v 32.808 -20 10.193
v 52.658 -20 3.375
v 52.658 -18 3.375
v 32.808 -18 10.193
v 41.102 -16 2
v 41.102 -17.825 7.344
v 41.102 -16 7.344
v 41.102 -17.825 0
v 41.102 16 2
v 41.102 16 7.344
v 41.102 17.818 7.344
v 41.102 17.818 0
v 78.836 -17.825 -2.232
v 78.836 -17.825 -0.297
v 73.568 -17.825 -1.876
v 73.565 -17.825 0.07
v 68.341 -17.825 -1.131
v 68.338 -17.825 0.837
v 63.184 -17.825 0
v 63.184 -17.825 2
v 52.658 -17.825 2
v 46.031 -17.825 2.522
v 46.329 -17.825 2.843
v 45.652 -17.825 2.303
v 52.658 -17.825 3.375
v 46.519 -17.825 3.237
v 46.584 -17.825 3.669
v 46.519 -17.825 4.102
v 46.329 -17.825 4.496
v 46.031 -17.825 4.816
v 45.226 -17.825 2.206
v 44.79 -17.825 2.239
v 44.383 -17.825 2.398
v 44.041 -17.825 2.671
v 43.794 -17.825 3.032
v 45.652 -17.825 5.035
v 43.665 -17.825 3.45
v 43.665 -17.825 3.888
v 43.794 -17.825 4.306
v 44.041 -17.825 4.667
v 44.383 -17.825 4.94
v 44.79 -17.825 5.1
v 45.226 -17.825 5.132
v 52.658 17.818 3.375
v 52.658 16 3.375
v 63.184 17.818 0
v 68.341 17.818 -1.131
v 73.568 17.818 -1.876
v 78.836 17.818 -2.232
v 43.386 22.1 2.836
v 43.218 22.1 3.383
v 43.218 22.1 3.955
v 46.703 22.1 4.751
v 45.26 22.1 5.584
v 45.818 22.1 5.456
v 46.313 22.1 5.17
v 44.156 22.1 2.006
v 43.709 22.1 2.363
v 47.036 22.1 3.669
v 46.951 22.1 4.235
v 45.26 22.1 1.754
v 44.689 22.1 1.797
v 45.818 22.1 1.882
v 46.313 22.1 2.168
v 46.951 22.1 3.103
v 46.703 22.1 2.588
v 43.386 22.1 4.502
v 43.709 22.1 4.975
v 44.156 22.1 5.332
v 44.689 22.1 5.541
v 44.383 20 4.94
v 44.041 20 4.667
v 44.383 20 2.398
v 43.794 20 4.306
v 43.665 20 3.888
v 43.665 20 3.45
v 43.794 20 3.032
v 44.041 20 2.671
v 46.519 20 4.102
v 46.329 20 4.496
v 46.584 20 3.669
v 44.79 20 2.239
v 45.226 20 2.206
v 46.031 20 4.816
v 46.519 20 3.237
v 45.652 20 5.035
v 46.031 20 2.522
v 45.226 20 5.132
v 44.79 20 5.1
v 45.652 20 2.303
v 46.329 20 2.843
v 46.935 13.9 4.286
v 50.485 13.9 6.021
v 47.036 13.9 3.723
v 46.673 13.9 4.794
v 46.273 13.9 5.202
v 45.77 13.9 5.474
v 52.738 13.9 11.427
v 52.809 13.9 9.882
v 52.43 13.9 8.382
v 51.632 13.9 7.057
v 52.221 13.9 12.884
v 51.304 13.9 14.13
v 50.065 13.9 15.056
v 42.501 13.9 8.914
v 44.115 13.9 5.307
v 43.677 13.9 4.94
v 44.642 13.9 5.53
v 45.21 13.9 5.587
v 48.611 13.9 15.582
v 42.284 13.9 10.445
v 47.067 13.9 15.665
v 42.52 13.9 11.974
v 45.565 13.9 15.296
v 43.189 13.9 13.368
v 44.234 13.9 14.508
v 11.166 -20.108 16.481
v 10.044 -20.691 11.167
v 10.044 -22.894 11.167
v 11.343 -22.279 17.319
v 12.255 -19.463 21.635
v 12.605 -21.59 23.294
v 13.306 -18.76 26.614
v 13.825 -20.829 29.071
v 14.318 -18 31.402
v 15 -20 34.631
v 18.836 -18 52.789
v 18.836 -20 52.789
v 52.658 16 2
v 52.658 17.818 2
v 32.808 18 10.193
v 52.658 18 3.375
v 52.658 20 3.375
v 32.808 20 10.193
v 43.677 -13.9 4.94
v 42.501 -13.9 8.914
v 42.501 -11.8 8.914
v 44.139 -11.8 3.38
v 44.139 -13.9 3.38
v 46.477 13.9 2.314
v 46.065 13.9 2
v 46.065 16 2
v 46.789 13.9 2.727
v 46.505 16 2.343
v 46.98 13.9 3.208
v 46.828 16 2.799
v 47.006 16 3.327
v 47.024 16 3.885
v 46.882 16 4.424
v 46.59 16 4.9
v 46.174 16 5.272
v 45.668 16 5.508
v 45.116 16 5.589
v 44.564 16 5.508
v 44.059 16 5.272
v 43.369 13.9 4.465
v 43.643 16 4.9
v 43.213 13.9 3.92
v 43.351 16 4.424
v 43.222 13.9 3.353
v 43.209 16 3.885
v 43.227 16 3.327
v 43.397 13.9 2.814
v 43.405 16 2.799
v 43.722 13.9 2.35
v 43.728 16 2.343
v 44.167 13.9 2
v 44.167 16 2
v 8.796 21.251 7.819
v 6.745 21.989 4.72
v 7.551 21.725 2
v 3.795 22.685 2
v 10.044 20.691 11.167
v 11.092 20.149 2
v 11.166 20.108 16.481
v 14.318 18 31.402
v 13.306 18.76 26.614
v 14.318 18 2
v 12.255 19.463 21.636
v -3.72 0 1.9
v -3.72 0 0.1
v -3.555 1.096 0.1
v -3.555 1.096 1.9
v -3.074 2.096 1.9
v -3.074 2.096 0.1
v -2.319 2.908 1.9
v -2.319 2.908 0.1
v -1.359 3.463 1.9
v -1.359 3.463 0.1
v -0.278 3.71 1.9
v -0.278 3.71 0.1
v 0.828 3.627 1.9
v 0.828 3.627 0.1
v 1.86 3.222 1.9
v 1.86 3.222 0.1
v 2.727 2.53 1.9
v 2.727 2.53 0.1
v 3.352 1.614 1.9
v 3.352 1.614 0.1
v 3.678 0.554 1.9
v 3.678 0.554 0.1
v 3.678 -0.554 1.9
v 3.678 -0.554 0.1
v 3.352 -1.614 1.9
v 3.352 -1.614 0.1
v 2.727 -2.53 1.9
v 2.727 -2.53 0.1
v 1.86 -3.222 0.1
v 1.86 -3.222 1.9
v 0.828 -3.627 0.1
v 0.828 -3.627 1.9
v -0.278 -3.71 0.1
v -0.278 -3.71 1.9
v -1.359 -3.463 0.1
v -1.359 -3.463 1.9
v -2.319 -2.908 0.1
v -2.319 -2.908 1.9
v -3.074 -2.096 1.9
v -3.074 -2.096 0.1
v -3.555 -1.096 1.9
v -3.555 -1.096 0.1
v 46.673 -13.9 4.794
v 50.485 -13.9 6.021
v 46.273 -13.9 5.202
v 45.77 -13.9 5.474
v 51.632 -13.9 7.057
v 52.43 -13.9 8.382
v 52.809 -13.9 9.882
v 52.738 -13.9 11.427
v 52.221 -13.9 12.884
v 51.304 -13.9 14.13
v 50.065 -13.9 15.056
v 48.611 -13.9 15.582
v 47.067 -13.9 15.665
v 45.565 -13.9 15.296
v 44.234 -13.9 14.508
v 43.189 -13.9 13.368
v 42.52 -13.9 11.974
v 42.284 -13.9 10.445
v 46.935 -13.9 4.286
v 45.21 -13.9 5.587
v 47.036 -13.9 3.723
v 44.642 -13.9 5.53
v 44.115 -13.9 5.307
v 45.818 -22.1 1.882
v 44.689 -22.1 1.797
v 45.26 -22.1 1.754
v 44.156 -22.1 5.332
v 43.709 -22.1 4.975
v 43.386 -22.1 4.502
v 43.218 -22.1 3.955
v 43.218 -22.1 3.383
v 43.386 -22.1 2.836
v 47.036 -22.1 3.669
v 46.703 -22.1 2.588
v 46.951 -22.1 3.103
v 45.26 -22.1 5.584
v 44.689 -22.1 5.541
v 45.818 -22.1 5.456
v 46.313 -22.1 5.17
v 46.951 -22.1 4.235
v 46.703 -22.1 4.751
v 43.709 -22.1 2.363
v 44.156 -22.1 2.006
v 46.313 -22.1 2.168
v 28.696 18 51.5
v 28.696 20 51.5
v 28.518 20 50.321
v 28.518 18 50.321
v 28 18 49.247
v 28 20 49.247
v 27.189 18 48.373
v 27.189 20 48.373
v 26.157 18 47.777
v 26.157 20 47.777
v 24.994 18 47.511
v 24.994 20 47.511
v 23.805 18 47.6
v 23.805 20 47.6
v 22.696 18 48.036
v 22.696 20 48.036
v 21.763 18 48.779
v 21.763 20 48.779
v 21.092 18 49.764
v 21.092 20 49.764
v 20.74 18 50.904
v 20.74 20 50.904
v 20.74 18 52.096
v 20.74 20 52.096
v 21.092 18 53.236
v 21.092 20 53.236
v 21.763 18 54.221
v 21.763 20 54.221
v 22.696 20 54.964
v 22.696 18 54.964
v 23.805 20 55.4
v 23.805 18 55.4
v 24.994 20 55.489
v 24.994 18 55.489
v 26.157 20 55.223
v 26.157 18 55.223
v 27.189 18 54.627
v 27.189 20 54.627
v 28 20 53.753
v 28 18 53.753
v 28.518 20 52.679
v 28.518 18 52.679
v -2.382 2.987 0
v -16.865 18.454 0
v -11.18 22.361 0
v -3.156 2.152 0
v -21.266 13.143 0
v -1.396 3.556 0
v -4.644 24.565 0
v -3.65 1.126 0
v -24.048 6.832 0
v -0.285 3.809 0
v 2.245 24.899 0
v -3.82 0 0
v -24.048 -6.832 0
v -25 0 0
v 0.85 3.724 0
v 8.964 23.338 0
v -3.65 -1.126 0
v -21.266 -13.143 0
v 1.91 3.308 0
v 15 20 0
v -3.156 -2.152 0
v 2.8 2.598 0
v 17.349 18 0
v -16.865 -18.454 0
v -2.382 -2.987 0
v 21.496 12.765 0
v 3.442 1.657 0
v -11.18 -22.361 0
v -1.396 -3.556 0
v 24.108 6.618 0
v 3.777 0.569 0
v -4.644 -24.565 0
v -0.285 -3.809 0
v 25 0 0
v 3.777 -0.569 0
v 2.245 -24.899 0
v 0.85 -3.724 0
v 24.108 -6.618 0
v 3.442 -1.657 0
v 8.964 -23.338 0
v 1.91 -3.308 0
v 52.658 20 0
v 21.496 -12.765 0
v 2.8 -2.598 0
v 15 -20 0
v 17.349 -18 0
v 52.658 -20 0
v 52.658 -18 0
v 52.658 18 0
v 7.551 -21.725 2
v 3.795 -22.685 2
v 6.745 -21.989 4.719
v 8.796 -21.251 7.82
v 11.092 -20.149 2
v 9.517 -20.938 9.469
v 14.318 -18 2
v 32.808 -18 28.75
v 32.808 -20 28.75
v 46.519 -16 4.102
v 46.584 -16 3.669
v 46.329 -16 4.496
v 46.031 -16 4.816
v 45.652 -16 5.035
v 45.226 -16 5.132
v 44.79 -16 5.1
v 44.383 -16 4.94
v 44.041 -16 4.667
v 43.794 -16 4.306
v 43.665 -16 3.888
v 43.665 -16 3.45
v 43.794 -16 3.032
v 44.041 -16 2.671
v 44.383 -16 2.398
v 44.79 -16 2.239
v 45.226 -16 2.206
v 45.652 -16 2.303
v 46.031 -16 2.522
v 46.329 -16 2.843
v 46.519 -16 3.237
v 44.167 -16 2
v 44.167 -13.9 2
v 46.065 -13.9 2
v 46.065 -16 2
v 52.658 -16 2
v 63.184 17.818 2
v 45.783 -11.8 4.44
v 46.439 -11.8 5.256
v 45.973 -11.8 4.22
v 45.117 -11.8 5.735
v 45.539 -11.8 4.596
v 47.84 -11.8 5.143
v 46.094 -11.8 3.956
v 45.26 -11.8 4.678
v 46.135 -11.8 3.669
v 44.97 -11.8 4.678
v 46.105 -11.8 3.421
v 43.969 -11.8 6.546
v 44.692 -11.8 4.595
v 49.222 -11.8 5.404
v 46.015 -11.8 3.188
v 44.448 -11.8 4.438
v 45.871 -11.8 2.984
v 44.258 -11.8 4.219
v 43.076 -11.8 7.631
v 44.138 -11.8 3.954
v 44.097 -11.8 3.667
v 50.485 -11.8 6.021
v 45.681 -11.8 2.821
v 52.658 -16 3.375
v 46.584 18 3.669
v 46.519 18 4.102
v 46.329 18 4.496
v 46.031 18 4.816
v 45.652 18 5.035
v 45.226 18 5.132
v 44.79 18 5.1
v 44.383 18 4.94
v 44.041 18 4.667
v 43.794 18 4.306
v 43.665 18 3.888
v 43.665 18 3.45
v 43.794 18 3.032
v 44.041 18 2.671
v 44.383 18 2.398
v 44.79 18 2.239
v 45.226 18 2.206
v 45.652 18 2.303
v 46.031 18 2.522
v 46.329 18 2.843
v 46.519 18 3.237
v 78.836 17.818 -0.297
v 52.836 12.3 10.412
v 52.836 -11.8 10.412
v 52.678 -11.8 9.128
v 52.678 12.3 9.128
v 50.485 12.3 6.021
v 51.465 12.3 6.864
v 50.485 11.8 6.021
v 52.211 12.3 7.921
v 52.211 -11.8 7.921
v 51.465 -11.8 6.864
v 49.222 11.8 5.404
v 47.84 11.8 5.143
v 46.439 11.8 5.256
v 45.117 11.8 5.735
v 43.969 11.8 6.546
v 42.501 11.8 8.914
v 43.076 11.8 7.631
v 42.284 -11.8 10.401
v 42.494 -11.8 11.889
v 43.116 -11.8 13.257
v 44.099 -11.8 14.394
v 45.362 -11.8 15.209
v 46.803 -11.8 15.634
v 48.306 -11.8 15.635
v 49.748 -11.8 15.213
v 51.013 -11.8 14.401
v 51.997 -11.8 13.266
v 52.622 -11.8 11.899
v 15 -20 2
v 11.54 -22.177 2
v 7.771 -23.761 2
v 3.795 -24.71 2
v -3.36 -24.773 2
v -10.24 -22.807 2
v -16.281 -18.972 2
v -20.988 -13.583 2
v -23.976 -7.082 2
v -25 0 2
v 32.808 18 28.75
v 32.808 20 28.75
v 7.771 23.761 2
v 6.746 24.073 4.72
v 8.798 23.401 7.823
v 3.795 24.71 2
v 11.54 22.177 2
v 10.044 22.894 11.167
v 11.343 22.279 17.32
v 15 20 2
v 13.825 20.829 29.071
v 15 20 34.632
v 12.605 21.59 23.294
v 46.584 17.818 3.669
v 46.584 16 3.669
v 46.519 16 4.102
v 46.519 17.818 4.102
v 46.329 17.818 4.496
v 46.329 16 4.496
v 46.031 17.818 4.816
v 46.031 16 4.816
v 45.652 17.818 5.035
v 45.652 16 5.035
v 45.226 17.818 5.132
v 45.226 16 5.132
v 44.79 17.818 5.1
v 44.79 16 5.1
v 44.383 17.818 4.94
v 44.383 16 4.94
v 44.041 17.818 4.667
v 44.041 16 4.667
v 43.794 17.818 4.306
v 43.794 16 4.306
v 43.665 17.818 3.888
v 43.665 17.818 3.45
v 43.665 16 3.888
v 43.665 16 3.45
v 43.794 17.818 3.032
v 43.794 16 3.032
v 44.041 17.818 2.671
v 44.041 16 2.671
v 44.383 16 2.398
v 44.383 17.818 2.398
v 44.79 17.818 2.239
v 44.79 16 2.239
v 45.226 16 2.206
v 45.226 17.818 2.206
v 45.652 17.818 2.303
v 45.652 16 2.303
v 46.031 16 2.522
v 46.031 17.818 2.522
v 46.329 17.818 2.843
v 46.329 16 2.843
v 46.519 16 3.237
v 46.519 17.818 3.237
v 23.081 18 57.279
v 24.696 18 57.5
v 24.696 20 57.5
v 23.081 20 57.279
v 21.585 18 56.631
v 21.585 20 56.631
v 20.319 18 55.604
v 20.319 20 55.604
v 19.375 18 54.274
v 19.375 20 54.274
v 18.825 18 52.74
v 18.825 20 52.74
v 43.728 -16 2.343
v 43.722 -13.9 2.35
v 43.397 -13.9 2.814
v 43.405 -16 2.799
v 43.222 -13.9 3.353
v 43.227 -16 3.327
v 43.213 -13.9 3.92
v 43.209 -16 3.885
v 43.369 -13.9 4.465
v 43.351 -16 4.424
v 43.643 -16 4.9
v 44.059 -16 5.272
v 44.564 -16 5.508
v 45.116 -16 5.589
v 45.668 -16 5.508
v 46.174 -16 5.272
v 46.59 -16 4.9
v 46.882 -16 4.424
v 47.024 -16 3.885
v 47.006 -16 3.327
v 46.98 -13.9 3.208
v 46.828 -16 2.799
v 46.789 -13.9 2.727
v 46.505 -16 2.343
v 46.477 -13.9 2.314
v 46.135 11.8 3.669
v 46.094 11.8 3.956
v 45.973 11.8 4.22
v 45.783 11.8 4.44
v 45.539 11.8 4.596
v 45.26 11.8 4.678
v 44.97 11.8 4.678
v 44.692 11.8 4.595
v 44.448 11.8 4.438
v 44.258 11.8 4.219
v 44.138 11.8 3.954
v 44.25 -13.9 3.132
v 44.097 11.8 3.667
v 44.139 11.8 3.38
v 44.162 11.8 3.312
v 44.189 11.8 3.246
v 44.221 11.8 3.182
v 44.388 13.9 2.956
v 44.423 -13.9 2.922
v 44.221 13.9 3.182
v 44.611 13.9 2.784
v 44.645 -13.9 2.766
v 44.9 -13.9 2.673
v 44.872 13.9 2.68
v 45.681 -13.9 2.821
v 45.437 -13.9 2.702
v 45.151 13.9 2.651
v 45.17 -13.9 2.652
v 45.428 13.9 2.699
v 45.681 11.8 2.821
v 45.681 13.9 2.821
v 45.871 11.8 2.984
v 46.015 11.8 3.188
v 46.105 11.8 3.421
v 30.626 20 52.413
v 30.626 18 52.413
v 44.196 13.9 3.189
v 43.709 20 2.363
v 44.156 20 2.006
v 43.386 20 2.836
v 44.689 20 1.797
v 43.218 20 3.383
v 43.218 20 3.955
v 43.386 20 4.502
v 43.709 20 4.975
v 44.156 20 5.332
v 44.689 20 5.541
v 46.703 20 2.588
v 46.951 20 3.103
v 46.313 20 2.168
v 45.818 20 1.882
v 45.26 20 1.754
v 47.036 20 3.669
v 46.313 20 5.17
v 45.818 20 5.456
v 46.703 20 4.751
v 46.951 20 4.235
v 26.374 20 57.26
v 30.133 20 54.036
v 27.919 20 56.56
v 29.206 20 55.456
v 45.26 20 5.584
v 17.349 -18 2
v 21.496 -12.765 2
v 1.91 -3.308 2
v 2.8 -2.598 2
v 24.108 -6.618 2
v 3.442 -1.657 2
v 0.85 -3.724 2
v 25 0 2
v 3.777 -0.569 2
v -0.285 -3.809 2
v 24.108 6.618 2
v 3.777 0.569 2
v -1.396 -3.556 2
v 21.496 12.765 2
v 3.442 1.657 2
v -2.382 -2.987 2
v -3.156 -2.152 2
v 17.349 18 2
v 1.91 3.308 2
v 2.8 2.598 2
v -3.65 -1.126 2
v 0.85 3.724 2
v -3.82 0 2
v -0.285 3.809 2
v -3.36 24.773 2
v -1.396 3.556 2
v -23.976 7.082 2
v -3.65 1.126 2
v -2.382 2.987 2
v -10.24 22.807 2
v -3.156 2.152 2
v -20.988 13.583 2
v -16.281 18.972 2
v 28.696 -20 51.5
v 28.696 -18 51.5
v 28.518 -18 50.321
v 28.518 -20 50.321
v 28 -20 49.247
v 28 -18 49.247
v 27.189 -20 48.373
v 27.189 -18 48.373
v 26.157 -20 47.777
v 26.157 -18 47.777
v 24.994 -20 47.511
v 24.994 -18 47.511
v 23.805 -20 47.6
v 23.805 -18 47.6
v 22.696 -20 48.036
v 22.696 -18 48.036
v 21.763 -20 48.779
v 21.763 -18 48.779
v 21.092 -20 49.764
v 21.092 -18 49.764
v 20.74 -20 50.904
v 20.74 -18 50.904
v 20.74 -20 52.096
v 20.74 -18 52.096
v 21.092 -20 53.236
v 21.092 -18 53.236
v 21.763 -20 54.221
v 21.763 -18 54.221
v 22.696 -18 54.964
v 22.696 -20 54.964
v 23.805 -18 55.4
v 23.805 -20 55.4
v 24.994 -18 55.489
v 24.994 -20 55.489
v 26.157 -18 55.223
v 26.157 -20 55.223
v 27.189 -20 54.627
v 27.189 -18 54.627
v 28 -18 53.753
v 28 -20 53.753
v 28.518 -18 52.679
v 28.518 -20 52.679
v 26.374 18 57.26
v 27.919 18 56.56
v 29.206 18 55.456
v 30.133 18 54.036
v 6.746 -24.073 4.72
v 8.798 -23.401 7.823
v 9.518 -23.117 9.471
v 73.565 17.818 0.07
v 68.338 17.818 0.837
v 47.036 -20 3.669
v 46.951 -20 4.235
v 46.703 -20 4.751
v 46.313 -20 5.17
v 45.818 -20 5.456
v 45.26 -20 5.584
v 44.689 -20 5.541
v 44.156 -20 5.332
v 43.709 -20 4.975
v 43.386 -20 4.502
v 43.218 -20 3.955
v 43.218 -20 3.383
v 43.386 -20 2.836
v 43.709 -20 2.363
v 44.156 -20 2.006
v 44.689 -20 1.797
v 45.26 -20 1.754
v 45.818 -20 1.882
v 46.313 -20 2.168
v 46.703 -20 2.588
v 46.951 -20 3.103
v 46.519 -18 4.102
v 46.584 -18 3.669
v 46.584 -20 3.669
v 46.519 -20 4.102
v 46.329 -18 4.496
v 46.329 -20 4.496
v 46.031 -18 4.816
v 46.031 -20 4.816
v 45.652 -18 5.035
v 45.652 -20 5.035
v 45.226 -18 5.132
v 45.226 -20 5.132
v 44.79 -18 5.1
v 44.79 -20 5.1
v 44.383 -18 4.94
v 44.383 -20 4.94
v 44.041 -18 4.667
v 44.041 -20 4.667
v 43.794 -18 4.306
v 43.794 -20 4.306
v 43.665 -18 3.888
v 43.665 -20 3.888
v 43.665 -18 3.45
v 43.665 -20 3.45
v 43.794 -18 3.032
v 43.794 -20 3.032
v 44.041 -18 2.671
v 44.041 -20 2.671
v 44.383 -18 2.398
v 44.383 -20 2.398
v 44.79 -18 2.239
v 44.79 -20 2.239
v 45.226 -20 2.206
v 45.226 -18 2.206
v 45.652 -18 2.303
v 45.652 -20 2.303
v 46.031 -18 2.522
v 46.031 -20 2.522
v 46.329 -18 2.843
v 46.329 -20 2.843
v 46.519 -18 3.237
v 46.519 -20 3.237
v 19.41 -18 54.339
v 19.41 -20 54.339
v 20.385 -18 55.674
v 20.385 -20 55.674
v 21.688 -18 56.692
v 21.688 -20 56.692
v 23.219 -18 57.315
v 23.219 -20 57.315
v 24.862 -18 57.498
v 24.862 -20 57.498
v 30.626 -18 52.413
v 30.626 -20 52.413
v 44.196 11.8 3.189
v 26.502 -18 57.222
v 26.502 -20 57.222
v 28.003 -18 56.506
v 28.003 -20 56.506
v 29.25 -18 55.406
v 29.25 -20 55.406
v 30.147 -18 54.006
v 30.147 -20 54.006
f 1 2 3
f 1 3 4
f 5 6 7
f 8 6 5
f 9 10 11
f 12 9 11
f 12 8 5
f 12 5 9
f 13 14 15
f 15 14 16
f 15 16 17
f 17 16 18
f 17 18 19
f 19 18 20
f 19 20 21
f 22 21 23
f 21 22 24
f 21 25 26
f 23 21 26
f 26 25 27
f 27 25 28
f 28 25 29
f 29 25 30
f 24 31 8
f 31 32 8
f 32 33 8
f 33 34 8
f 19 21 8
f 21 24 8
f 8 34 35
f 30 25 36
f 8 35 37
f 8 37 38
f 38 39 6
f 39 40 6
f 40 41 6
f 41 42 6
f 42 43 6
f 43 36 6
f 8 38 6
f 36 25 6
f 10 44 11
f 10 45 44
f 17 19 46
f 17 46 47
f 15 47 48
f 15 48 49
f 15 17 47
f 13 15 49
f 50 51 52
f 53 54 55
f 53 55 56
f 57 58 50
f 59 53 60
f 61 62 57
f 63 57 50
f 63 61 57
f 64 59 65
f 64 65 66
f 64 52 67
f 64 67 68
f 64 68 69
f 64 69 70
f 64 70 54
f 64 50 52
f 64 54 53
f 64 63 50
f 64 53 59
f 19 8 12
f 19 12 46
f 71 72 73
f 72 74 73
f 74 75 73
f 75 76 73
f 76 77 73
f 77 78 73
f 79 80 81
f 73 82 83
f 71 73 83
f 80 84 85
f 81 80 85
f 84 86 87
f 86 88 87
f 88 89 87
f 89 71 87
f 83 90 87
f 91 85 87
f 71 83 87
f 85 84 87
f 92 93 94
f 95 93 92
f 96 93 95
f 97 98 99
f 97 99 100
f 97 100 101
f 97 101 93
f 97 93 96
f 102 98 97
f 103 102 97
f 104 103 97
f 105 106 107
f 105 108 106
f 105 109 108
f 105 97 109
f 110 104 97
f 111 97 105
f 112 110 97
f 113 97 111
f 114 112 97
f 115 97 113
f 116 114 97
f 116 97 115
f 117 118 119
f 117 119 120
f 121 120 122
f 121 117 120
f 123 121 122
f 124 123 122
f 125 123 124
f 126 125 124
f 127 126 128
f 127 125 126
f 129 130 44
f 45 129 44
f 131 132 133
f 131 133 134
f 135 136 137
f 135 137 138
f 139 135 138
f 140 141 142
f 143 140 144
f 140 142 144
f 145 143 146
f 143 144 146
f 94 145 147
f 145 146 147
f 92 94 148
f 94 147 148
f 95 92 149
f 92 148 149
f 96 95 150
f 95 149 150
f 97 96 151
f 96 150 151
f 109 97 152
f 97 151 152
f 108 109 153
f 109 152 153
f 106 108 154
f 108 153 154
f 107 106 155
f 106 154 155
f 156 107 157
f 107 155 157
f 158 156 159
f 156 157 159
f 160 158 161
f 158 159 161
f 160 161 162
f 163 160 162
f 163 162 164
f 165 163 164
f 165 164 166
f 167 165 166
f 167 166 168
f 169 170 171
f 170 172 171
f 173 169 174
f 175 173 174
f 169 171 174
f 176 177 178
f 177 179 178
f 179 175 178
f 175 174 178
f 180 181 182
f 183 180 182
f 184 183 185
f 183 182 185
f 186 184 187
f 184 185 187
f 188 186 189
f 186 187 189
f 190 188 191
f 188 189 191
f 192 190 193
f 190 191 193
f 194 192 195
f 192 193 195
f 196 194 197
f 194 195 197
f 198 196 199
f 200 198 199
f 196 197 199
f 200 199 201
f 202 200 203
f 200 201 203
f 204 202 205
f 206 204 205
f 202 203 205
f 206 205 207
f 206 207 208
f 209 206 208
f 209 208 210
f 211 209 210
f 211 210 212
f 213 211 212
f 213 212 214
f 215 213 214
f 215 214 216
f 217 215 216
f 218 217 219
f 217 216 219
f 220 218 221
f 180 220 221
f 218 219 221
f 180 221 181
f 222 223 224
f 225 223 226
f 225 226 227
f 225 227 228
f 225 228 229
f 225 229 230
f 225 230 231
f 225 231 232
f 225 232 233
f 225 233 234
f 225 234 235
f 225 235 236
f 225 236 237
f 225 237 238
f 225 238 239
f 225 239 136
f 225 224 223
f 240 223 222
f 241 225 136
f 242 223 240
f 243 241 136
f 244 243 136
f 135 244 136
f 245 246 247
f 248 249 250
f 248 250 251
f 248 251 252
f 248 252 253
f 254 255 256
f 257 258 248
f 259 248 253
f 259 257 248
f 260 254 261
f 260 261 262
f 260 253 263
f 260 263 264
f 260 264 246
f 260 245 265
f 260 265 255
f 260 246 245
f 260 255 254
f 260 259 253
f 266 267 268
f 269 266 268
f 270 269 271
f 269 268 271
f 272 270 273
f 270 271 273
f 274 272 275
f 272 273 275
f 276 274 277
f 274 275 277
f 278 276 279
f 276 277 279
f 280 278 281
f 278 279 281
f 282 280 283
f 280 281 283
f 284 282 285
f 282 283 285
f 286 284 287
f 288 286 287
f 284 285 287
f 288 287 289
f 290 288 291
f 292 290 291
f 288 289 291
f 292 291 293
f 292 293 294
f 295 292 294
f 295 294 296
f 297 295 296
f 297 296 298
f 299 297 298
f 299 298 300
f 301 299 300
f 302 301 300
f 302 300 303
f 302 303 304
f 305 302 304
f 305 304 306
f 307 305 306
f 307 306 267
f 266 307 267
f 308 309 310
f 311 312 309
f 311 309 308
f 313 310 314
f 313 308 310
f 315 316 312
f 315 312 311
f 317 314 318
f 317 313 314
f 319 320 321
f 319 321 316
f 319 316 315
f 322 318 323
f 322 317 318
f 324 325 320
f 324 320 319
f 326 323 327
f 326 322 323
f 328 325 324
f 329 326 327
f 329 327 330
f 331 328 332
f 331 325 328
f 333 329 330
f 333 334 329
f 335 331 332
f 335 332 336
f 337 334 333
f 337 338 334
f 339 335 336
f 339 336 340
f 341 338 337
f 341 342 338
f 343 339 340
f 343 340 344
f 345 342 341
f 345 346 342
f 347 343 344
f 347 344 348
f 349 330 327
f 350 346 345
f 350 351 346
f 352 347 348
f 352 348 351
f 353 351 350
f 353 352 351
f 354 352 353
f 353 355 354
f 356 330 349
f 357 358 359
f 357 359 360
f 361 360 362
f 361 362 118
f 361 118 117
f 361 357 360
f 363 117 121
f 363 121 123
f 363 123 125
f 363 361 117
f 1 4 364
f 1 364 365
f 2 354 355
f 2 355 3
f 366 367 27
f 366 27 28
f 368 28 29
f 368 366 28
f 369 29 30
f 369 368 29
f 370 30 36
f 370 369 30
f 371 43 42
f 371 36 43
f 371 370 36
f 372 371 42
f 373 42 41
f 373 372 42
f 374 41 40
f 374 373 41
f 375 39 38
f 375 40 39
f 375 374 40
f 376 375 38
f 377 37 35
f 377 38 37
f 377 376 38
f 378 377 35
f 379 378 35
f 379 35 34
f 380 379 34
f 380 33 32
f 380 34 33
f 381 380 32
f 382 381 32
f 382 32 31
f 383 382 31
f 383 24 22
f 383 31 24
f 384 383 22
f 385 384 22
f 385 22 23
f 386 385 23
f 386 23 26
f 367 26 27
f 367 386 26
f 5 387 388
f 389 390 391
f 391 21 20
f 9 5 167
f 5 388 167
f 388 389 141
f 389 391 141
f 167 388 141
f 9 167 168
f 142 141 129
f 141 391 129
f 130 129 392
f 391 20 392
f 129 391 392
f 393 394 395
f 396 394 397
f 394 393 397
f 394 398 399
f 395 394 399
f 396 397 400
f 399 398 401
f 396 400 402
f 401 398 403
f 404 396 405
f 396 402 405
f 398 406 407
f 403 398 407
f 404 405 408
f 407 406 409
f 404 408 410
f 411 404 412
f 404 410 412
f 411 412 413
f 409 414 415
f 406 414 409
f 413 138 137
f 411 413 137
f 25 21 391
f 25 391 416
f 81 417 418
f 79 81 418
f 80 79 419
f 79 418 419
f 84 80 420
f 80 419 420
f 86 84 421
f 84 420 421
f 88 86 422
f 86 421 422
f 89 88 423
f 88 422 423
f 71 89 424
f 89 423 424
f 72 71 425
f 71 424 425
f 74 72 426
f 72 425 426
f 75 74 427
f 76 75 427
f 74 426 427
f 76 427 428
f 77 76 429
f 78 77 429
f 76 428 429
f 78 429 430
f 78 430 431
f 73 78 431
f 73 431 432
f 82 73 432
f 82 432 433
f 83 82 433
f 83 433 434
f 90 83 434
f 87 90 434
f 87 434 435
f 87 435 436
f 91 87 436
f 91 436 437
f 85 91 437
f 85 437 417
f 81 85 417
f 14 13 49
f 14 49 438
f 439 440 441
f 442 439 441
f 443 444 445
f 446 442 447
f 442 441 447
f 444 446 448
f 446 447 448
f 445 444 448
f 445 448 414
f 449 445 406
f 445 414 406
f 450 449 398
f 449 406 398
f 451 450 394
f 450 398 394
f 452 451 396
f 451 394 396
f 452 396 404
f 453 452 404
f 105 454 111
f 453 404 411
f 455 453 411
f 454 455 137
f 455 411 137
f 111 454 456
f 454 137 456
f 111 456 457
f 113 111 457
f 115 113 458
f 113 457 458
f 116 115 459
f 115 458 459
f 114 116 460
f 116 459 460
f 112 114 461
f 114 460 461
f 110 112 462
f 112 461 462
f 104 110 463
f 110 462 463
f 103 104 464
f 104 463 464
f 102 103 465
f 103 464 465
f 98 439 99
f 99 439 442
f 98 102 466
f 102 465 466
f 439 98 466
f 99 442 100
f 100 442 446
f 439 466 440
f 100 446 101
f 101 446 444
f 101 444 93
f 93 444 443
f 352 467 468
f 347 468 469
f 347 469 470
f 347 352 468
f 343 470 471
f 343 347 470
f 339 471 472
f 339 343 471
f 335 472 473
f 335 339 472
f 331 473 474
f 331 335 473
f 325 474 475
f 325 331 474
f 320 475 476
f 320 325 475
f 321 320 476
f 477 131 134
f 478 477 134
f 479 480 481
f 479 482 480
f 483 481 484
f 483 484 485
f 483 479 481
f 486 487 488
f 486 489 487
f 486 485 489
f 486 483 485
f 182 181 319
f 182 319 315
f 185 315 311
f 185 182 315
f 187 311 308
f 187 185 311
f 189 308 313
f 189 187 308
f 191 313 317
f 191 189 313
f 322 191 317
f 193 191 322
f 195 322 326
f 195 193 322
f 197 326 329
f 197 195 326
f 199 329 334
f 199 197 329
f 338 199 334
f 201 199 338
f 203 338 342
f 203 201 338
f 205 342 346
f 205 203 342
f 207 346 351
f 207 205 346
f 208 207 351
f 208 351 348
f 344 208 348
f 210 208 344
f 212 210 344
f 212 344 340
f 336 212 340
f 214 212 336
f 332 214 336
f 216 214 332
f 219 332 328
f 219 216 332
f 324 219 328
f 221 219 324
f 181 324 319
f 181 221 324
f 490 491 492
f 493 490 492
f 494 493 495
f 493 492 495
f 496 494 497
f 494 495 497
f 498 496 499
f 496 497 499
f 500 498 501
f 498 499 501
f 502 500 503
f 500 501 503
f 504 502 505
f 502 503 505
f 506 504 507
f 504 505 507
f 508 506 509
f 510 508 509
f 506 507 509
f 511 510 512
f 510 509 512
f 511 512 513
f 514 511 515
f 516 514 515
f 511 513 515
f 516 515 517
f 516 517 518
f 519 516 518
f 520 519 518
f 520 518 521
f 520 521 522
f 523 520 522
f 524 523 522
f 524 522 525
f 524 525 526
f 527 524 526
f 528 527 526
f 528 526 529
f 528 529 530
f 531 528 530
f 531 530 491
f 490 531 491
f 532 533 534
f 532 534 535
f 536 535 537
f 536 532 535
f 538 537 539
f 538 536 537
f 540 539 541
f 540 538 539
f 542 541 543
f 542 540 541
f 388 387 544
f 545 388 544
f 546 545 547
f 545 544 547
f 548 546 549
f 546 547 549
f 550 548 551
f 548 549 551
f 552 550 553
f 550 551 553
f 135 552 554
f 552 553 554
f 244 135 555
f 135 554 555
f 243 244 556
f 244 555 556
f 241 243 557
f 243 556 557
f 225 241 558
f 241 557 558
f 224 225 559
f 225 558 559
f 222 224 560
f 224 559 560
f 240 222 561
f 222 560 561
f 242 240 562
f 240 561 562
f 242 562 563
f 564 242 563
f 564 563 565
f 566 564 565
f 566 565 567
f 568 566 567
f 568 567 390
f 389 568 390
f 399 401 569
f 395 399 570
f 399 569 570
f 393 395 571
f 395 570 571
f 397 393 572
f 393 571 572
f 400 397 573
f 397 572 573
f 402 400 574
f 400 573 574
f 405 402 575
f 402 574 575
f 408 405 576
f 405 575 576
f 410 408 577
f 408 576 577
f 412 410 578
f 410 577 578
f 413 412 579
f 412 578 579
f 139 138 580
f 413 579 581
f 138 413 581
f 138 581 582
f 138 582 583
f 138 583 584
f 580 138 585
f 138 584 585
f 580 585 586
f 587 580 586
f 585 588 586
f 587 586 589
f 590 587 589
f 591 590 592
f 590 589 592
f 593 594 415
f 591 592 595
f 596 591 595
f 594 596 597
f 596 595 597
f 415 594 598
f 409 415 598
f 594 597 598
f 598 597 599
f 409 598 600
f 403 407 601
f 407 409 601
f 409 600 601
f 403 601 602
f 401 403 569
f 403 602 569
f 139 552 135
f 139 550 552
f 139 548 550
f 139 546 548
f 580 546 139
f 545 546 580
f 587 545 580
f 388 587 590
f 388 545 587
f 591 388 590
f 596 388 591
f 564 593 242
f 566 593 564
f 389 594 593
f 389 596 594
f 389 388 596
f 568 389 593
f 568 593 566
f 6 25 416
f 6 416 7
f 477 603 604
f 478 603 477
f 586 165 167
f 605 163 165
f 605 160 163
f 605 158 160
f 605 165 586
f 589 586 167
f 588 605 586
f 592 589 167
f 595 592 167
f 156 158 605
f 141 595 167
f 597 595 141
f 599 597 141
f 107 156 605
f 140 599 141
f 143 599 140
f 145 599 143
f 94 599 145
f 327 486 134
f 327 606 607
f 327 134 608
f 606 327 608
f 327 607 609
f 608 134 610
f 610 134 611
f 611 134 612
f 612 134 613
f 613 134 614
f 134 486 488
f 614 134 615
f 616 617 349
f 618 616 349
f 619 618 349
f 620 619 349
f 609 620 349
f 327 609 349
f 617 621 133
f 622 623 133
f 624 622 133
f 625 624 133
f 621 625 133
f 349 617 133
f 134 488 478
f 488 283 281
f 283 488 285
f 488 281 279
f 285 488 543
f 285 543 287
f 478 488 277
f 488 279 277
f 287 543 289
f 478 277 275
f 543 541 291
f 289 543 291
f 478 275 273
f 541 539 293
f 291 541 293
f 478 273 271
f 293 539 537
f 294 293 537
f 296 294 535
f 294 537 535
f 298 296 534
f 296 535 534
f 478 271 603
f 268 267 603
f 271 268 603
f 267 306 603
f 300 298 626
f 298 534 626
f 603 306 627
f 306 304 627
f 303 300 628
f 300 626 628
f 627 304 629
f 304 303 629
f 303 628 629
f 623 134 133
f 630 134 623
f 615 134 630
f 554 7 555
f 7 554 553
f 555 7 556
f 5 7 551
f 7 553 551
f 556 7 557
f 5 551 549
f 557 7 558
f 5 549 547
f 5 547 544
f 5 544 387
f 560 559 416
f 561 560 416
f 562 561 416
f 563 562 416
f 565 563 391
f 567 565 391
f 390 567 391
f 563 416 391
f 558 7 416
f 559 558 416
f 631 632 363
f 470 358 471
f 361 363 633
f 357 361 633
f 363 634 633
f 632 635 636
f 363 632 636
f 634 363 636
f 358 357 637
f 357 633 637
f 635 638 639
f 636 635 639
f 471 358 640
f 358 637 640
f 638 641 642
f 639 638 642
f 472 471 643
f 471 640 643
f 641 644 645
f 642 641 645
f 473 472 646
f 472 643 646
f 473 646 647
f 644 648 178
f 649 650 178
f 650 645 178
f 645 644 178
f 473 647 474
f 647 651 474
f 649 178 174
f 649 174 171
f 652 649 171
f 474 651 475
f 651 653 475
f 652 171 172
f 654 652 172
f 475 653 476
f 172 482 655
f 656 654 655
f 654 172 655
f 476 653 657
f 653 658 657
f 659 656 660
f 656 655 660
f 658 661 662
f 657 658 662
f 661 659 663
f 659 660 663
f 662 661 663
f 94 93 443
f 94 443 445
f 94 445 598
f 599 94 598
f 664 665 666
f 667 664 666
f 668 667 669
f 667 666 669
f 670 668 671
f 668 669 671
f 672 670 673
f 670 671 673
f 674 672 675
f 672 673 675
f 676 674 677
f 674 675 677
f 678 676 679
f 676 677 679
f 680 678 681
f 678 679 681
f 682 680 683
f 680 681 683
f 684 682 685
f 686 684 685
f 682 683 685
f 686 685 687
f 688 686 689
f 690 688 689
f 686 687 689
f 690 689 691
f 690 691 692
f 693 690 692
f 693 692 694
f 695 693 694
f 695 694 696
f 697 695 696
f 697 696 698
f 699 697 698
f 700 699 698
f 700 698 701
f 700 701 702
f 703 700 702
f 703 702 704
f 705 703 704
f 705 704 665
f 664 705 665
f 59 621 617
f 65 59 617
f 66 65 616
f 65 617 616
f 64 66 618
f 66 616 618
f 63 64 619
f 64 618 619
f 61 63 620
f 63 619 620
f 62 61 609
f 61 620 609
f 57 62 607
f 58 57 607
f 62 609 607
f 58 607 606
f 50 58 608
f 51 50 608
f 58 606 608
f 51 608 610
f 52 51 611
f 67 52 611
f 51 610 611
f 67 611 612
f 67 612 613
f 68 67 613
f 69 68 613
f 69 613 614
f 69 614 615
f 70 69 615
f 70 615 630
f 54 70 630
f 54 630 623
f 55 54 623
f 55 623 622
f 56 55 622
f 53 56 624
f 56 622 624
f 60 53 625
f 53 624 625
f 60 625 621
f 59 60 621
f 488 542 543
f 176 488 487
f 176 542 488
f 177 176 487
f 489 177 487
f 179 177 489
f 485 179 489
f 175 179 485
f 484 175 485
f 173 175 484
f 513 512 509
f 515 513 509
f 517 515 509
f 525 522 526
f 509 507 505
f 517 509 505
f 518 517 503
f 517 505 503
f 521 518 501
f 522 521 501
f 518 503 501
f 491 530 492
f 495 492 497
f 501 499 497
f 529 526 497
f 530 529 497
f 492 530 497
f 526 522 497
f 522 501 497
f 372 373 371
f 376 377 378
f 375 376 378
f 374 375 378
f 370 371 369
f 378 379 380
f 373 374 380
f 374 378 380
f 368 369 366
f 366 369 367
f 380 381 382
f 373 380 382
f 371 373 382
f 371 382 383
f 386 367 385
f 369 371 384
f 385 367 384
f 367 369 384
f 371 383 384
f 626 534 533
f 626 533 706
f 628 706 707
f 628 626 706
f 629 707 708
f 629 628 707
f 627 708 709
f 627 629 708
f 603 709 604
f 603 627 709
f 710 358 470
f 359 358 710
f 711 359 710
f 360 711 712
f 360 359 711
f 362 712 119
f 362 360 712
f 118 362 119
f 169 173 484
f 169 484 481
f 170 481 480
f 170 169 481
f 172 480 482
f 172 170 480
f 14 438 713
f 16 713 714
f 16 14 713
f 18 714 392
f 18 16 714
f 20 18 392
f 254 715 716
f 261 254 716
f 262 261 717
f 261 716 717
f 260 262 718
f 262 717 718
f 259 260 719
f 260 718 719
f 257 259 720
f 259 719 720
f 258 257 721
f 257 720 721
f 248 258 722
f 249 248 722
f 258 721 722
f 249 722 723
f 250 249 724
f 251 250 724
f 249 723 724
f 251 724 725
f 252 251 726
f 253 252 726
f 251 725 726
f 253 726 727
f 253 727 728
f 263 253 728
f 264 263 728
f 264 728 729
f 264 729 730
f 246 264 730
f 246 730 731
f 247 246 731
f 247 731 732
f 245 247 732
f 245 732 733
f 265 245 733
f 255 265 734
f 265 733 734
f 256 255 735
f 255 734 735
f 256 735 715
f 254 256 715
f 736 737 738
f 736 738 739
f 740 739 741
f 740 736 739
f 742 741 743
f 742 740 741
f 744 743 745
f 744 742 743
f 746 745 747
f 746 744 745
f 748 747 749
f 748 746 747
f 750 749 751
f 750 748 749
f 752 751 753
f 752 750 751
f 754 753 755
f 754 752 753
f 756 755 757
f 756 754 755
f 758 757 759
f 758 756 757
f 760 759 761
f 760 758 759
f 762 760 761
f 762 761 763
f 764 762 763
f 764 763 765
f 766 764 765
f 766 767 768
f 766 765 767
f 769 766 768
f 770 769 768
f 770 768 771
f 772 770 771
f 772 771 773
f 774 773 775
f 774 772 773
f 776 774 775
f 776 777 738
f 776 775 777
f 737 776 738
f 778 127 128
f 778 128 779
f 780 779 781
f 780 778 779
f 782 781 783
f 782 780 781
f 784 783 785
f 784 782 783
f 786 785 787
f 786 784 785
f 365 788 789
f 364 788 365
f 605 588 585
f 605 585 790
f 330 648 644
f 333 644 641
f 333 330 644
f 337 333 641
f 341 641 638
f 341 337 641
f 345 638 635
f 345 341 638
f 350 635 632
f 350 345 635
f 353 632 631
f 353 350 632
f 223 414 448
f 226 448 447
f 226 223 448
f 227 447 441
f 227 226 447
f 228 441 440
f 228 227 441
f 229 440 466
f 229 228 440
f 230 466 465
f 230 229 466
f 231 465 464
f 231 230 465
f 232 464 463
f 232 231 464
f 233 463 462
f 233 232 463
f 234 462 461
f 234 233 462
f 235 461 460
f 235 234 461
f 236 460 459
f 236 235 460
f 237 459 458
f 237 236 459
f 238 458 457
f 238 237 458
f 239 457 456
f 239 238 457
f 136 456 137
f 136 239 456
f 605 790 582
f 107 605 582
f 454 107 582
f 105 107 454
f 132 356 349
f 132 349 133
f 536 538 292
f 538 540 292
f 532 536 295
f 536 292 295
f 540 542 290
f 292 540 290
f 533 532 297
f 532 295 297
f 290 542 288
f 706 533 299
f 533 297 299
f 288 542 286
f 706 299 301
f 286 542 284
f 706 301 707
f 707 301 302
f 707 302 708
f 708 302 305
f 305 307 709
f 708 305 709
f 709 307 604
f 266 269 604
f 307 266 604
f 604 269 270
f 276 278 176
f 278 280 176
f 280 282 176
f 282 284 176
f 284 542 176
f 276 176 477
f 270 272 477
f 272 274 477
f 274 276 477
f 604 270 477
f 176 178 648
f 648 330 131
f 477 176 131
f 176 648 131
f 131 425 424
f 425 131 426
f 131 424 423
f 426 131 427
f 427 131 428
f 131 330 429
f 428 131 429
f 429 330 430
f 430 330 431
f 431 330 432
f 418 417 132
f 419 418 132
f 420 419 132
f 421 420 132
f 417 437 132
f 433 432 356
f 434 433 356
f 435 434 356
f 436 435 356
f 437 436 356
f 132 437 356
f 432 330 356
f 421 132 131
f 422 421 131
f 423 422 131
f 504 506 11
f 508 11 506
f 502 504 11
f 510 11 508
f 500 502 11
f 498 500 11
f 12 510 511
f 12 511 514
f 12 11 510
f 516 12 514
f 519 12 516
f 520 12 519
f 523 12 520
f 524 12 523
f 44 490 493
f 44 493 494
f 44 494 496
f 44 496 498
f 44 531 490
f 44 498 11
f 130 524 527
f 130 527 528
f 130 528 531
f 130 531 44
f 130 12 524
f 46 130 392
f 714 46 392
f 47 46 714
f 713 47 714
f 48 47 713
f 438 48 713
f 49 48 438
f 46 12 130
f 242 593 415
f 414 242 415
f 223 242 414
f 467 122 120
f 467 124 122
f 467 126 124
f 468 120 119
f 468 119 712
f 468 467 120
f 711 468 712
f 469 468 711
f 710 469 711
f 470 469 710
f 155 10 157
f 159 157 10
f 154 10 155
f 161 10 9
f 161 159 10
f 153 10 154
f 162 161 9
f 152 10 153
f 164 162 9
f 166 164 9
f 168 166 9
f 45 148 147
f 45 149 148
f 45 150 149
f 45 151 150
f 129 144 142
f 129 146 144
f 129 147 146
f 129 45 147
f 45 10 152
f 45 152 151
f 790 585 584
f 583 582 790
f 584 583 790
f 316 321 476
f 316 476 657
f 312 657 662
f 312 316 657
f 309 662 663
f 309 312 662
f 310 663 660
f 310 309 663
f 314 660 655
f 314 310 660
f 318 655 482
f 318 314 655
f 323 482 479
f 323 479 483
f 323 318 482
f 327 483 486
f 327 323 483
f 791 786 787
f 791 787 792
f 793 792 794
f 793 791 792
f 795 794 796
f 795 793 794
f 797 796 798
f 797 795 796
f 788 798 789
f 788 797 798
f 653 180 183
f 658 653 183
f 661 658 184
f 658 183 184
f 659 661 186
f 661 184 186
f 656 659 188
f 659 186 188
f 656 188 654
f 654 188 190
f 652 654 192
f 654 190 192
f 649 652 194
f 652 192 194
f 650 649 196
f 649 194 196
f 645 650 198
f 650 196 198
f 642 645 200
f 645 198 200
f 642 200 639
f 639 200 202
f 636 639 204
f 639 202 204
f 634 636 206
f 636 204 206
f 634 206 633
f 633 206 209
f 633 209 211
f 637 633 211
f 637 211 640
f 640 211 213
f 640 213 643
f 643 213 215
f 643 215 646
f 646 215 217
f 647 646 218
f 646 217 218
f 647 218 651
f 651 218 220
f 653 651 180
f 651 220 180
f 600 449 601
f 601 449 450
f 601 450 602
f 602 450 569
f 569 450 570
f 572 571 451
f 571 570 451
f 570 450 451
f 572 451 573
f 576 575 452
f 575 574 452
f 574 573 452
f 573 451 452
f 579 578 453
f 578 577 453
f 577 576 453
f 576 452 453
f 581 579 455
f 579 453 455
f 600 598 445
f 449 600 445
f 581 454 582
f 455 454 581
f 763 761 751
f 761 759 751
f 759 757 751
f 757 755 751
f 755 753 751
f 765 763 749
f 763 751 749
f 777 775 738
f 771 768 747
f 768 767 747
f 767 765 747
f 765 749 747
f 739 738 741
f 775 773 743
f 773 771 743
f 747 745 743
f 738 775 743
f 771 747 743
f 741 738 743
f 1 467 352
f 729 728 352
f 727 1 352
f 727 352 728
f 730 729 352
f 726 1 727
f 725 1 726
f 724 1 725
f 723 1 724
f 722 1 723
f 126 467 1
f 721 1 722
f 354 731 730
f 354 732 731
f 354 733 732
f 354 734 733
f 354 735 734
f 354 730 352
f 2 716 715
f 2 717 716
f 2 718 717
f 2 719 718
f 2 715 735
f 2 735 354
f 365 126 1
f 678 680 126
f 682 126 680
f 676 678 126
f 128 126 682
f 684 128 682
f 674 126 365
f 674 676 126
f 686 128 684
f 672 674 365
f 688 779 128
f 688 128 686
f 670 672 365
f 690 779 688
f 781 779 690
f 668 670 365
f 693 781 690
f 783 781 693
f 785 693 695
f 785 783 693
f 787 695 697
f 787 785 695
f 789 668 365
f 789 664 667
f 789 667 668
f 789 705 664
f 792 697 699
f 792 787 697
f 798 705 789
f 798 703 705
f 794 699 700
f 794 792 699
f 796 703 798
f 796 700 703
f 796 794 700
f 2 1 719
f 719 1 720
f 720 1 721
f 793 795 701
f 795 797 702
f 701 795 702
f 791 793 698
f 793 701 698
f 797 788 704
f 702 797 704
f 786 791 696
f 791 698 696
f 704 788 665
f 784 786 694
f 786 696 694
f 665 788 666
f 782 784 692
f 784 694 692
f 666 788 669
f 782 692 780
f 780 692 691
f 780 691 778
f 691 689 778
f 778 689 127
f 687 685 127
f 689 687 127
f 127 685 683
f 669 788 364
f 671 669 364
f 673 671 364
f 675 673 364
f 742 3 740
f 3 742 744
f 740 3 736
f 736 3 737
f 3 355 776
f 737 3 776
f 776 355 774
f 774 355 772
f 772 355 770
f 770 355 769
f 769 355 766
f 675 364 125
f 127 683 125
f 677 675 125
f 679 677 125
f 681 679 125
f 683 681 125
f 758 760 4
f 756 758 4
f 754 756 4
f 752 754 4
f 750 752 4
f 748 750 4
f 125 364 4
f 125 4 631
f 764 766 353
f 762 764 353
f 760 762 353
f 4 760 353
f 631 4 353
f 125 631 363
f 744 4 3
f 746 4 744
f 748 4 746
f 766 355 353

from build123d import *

# Parameters (mm, degrees)
EXTRUDE_2_DEPTH      = 57.5
SKETCH_3_R           = 4
CUT_EXTRUDE_1_DEPTH  = 57.5
CUT_EXTRUDE_3_DEPTH  = 57.5
CUT_EXTRUDE_4_DEPTH  = 57.5
SKETCH_9_R           = 25
CUT_EXTRUDE_5_DEPTH  = 2
EXTRUDE_6_DEPTH      = 57.5
SKETCH_15_R          = 4
CUT_EXTRUDE_6_DEPTH  = 57.5
CUT_EXTRUDE_8_DEPTH  = 57.5
CUT_EXTRUDE_9_DEPTH  = 57.5
CUT_EXTRUDE_10_DEPTH = 57.5
CUT_EXTRUDE_11_DEPTH = 57.5
SKETCH_23_R          = 25
EXTRUDE_7_DEPTH      = 2
SKETCH_24_R          = 3.72
CUT_EXTRUDE_12_DEPTH = 2
CHAMFER_1_SIZE       = 0.1
EXTRUDE_9_DEPTH      = 40
CUT_EXTRUDE_14_DEPTH = 15
CUT_EXTRUDE_15_DEPTH = 15
SKETCH_30_W          = 12
SKETCH_30_H          = 32
CUT_EXTRUDE_17_DEPTH = 27
SKETCH_31_W          = 8.294333237
SKETCH_31_H          = 36
CUT_EXTRUDE_18_DEPTH = 12
CUT_EXTRUDE_19_DEPTH = 12
CUT_EXTRUDE_20_DEPTH = 12
CUT_EXTRUDE_23_DEPTH = 12
CUT_EXTRUDE_24_DEPTH = 20
SKETCH_36_R          = 1.46736887
CUT_EXTRUDE_25_DEPTH = 20
SKETCH_37_R          = 1.46736887
CUT_EXTRUDE_26_DEPTH = 41
SKETCH_38_R          = 1.92
EXTRUDE_11_DEPTH     = 2.1
SKETCH_40_R          = 1.92
EXTRUDE_12_DEPTH     = 2.1
SKETCH_41_R          = 1.92
EXTRUDE_13_DEPTH     = 2.1
SKETCH_42_R          = 1.92
EXTRUDE_14_DEPTH     = 2.1
SKETCH_44_R          = 1.018985512
EXTRUDE_15_DEPTH     = 28.1
EXTRUDE_16_DEPTH     = 2.1
EXTRUDE_17_DEPTH     = 2.1
SKETCH_48_R          = 5.276260096
EXTRUDE_18_DEPTH     = 24.1


with BuildPart() as part:
    # 草图1 → 凸台-拉伸2 (new body)
    with BuildSketch(Plane.XY):
        with BuildLine():
            Line((32.808047079, 20), (15, 20))
            ThreePointArc((15, 20), (7.90569415, 23.717082451), (0, 25))
            Line((0, 25), (0, 23))
            ThreePointArc((0, 23), (7.582875444, 21.714050751), (14.317821063, 18))
            Line((14.317821063, 18), (32.808047079, 18))
            Line((32.808047079, 18), (32.808047079, 20))
        make_face()
    extrude(amount=EXTRUDE_2_DEPTH)

    # 草图3 → 切除-拉伸1 (cut)
    with BuildSketch(Plane(origin=(0, 20, 0), x_dir=(1, 0, 0), z_dir=(0, 1, 0))):
        with Locations((24.695503774, -51.5)):
            Circle(SKETCH_3_R)
    extrude(amount=-CUT_EXTRUDE_1_DEPTH, mode=Mode.SUBTRACT)

    # 草图4 → 切除-拉伸3 (cut)
    with BuildSketch(Plane(origin=(0, 20, 0), x_dir=(1, 0, 0), z_dir=(0, 1, 0))):
        with BuildLine():
            Line((30.625605567, -52.413177272), (32.808047079, -28.75))
            Line((32.808047079, -28.75), (32.808047079, -57.5))
            Line((32.808047079, -57.5), (24.695503774, -57.5))
            ThreePointArc((24.695503774, -57.5), (28.601968696, -56.054067612), (30.625605567, -52.413177272))
        make_face()
    extrude(amount=-CUT_EXTRUDE_3_DEPTH, mode=Mode.SUBTRACT)

    # 草图7 → 切除-拉伸4 (cut)
    with BuildSketch(Plane.XZ.offset(-18)):
        with BuildLine():
            Line((18.825041072, 52.74002728), (10.043595458, 11.167434671))
            ThreePointArc((10.043595458, 11.167434671), (6.410396371, 4.334860869), (0, 0))
            Line((0, 0), (0, 57.5))
            Line((0, 57.5), (24.695503774, 57.5))
            ThreePointArc((24.695503774, 57.5), (20.916625877, 56.160480859), (18.825041072, 52.74002728))
        make_face()
    extrude(amount=-CUT_EXTRUDE_4_DEPTH, mode=Mode.SUBTRACT)

    # 草图9 → 切除-拉伸5 (cut)
    with BuildSketch(Plane(origin=(0, 0, 0), x_dir=(-1, 0, 0), z_dir=(0, 0, -1))):
        Circle(SKETCH_9_R)
    extrude(amount=-CUT_EXTRUDE_5_DEPTH, mode=Mode.SUBTRACT)



with BuildPart() as body_2:
    # 草图14 → 凸台-拉伸6 (new body)
    with BuildSketch(Plane(origin=(0, 0, 0), x_dir=(-1, 0, 0), z_dir=(0, 0, -1))):
        with BuildLine():
            Line((-32.808047079, -18), (-32.808047079, -20))
            Line((-32.808047079, -20), (-15, -20))
            ThreePointArc((-15, -20), (-9.688083112, -23.04649747), (-3.794918318, -24.7102933))
            Line((-3.794918318, -24.7102933), (-3.794918318, -22.684765702))
            ThreePointArc((-3.794918318, -22.684765702), (-9.354388777, -21.01179218), (-14.317821063, -18))
            Line((-14.317821063, -18), (-32.808047079, -18))
        make_face()
    extrude(amount=-EXTRUDE_6_DEPTH)

    # 草图15 → 切除-拉伸6 (cut)
    with BuildSketch(Plane(origin=(0, -18, 0), x_dir=(1, 0, 0), z_dir=(0, 1, 0))):
        with Locations((24.695503774, -51.5)):
            Circle(SKETCH_15_R)
    extrude(amount=-CUT_EXTRUDE_6_DEPTH, mode=Mode.SUBTRACT)

    # 草图16 → 切除-拉伸8 (cut)
    with BuildSketch(Plane(origin=(0, -18, 0), x_dir=(1, 0, 0), z_dir=(0, 1, 0))):
        with BuildLine():
            Line((32.808047079, -28.75), (32.808047079, -57.5))
            Line((32.808047079, -57.5), (24.861627034, -57.5))
            Line((24.861627034, -57.5), (24.861577165, -57.497701195))
            ThreePointArc((24.861577165, -57.497701195), (28.664626328, -55.999562884), (30.625605567, -52.413177272))
            Line((30.625605567, -52.413177272), (32.808047079, -28.75))
        make_face()
    extrude(amount=-CUT_EXTRUDE_8_DEPTH, mode=Mode.SUBTRACT)

    # 草图19 → 切除-拉伸9 (cut)
    with BuildSketch(Plane(origin=(0, -18, 0), x_dir=(1, 0, 0), z_dir=(0, 1, 0))):
        with BuildLine():
            Line((24.861577165, -57.497701195), (24.86687886, -57.502607272))
            Line((24.86687886, -57.502607272), (24.85757633, -57.503176041))
            Line((24.85757633, -57.503176041), (24.480600253, -57.542626824))
            Line((24.480600253, -57.542626824), (6.962638036, -59.37589256))
            Line((6.962638036, -59.37589256), (-10.592119025, -60.449213304))
            Line((-10.592119025, -60.449213304), (-4.928306335, -45.22845997))
            Line((-4.928306335, -45.22845997), (3.794918318, -2))
            Line((3.794918318, -2), (10.043595458, -11.167434671))
            Line((10.043595458, -11.167434671), (18.8355582, -52.788812582))
            ThreePointArc((18.8355582, -52.788812582), (21.001122486, -56.227742262), (24.861577165, -57.497701195))
        make_face()
    extrude(amount=-CUT_EXTRUDE_9_DEPTH, mode=Mode.SUBTRACT)

    # 草图20 → 切除-拉伸10 (cut)
    with BuildSketch(Plane(origin=(0, -18, 0), x_dir=(1, 0, 0), z_dir=(0, 1, 0))):
        with BuildLine():
            Line((10.043595458, -11.167434671), (3.794918318, -2))
            ThreePointArc((3.794918318, -2), (7.73750589, -6.0259851), (10.043595458, -11.167434671))
        make_face()
    extrude(amount=-CUT_EXTRUDE_10_DEPTH, mode=Mode.SUBTRACT)

    # 草图21 → 切除-拉伸11 (cut)
    with BuildSketch(Plane(origin=(0, -18, 0), x_dir=(1, 0, 0), z_dir=(0, 1, 0))):
        Polygon((15.295240659, 2.241651299), (15, 0), (15, -2), (2.39786402, -2), (2.909026621, 1.881065404), align=None)
    extrude(amount=-CUT_EXTRUDE_11_DEPTH, mode=Mode.SUBTRACT)


with BuildPart() as part_1:
    add(part.part)

    add(body_2.part)  # 凸台-拉伸7 merges body 2
    # 草图23 → 凸台-拉伸7 (add)
    with BuildSketch(Plane(origin=(0, 0, 0), x_dir=(-1, 0, 0), z_dir=(0, 0, -1))):
        Circle(SKETCH_23_R)
    extrude(amount=-EXTRUDE_7_DEPTH)

    # 草图24 → 切除-拉伸12 (cut)
    with BuildSketch(Plane(origin=(0, 0, 0), x_dir=(-1, 0, 0), z_dir=(0, 0, -1))):
        Circle(SKETCH_24_R)
    extrude(amount=-CUT_EXTRUDE_12_DEPTH, mode=Mode.SUBTRACT)

    # 倒角1
    chamfer_1_edges = [part_1.edges().sort_by_distance(p)[0] for p in [
        (3.72, 0, 2),
        (3.72, 0, 0),
    ]]
    chamfer(chamfer_1_edges, length=CHAMFER_1_SIZE)

    # 草图26 → 凸台-拉伸9 (add)
    with BuildSketch(Plane.XZ.offset(20)):
        with BuildLine():
            Line((32.808047079, 10.19334042), (32.808047079, 0))
            Line((32.808047079, 0), (63.183525326, 0))
            ThreePointArc((63.183525326, 0), (70.947678861, -1.551923201), (78.83611453, -2.232458611))
            Line((78.83611453, -2.232458611), (78.83611453, -0.296960192))
            ThreePointArc((78.83611453, -0.296960192), (70.94404806, 0.40331883), (63.183525326, 2))
            Line((63.183525326, 2), (52.65799007, 2))
            Line((52.65799007, 2), (52.65799007, 3.375299413))
            Line((52.65799007, 3.375299413), (32.808047079, 10.19334042))
        make_face()
    extrude(amount=-EXTRUDE_9_DEPTH)

    # 草图28 → 切除-拉伸14 (cut)
    with BuildSketch(Plane(origin=(0, -18, 0), x_dir=(1, 0, 0), z_dir=(0, 1, 0))):
        Polygon((52.65799007, -2), (52.65799007, 6.350342188), (82.074205035, 6.350342188), (82.074205035, -4.817139338), (68.068579033, -9.691343982), align=None)
    extrude(amount=-CUT_EXTRUDE_14_DEPTH, mode=Mode.SUBTRACT)

    # 草图29 → 切除-拉伸15 (cut)
    with BuildSketch(Plane.XZ.offset(-18)):
        Polygon((52.65799007, 0), (52.65799007, 7.965251967), (80.923514967, 6.232128634), (83.715769225, -14.372782098), (61.47401979, -14.372782098), align=None)
    extrude(amount=-CUT_EXTRUDE_15_DEPTH, mode=Mode.SUBTRACT)

    # 草图30 → 切除-拉伸17 (cut)
    with BuildSketch(Plane(origin=(52.65799007, 0, 0), x_dir=(0, 0, -1), z_dir=(1, 0, 0))):
        with Locations((-8, 0)):
            Rectangle(SKETCH_30_W, SKETCH_30_H)
    extrude(amount=-CUT_EXTRUDE_17_DEPTH, mode=Mode.SUBTRACT)

    # 草图31 → 切除-拉伸18 (cut)
    with BuildSketch(Plane(origin=(0, 0, 0), x_dir=(-1, 0, 0), z_dir=(0, 0, -1))):
        with Locations((-36.955213697, 0)):
            Rectangle(SKETCH_31_W, SKETCH_31_H)
    extrude(amount=-CUT_EXTRUDE_18_DEPTH, mode=Mode.SUBTRACT)

    # 草图32 → 切除-拉伸19 (cut)
    with BuildSketch(Plane(origin=(0, 0, 0), x_dir=(-1, 0, 0), z_dir=(0, 0, -1))):
        with BuildLine():
            Line((-41.102380316, 18), (-41.102380316, 17.817791972))
            Line((-41.102380316, 17.817791972), (-80.480762485, 17.817791972))
            ThreePointArc((-80.480762485, 17.817791972), (-80.431701481, 17.995518627), (-80.298413844, 18.122908389))
            Line((-80.298413844, 18.122908389), (-78.83611453, 18))
            Line((-78.83611453, 18), (-41.102380316, 18))
        make_face()
    extrude(amount=-CUT_EXTRUDE_19_DEPTH, mode=Mode.SUBTRACT)

    # 草图33 → 切除-拉伸20 (cut)
    with BuildSketch(Plane(origin=(0, 0, 0), x_dir=(-1, 0, 0), z_dir=(0, 0, -1))):
        Polygon((-41.102380316, 17.817791972), (-41.102380316, 18), (-90.865382044, 18), (-92.565249906, 18), (-78.83611453, 17.817791972), align=None)
    extrude(amount=CUT_EXTRUDE_20_DEPTH, mode=Mode.SUBTRACT)

    # 草图34 → 切除-拉伸23 (cut)
    with BuildSketch(Plane(origin=(0, 0, 0), x_dir=(-1, 0, 0), z_dir=(0, 0, -1))):
        Polygon((-41.102380316, -18), (-41.102380316, -17.824542894), (-87.599456562, -17.824542894), (-86.587720707, -19.826682733), (-63.183525326, -18), align=None)
    extrude(amount=-CUT_EXTRUDE_23_DEPTH, mode=Mode.SUBTRACT)

    # 草图35 → 切除-拉伸24 (cut)
    with BuildSketch(Plane(origin=(0, 0, 0), x_dir=(-1, 0, 0), z_dir=(0, 0, -1))):
        Polygon((-63.183525326, -17.824542894), (-63.012723337, -20.623418586), (-79.237126126, -22.411765773), (-80.680731686, -17.046724213), (-78.83611453, -17.824542894), align=None)
    extrude(amount=CUT_EXTRUDE_24_DEPTH, mode=Mode.SUBTRACT)

    # 草图36 → 切除-拉伸25 (cut)
    with BuildSketch(Plane.XZ.offset(-16)):
        with Locations((45.116344536, 3.66912659)):
            Circle(SKETCH_36_R)
    extrude(amount=-CUT_EXTRUDE_25_DEPTH, mode=Mode.SUBTRACT)

    # 草图37 → 切除-拉伸26 (cut)
    with BuildSketch(Plane.XZ.offset(-16)):
        with Locations((45.116344536, 3.66912659)):
            Circle(SKETCH_37_R)
    extrude(amount=CUT_EXTRUDE_26_DEPTH, mode=Mode.SUBTRACT)

    # 草图38 → 凸台-拉伸11 (add)
    with BuildSketch(Plane.XZ.offset(20)):
        with Locations((45.116344536, 3.66912659)):
            Circle(SKETCH_38_R)
    extrude(amount=EXTRUDE_11_DEPTH)

    # 草图40 → 凸台-拉伸12 (add)
    with BuildSketch(Plane(origin=(0, -16, 0), x_dir=(1, 0, 0), z_dir=(0, 1, 0))):
        with Locations((45.116344536, -3.66912659)):
            Circle(SKETCH_40_R)
    extrude(amount=EXTRUDE_12_DEPTH)

    # 草图41 → 凸台-拉伸13 (add)
    with BuildSketch(Plane(origin=(0, 20, 0), x_dir=(1, 0, 0), z_dir=(0, 1, 0))):
        with Locations((45.116344536, -3.66912659)):
            Circle(SKETCH_41_R)
    extrude(amount=EXTRUDE_13_DEPTH)

    # 草图42 → 凸台-拉伸14 (add)
    with BuildSketch(Plane.XZ.offset(-16)):
        with Locations((45.116344536, 3.66912659)):
            Circle(SKETCH_42_R)
    extrude(amount=EXTRUDE_14_DEPTH)

    # 草图44 → 凸台-拉伸15 (add)
    with BuildSketch(Plane.XZ.offset(-13.9)):
        with Locations((45.116344536, 3.66912659)):
            Circle(SKETCH_44_R)
    extrude(amount=EXTRUDE_15_DEPTH)

    # 草图45 → 凸台-拉伸16 (add)
    with BuildSketch(Plane(origin=(0, -13.9, 0), x_dir=(1, 0, 0), z_dir=(0, 1, 0))):
        with BuildLine():
            Line((45.681240761, -2.821055998), (50.484835639, -6.020710177))
            ThreePointArc((50.484835639, -6.020710177), (49.357454542, -15.372571666), (42.500675194, -8.914020867))
            Line((42.500675194, -8.914020867), (44.139288, -3.379830892))
            Line((44.139288, -3.379830892), (45.681240761, -2.821055998))
        make_face()
    extrude(amount=EXTRUDE_16_DEPTH)

    # 草图46 → 凸台-拉伸17 (add)
    with BuildSketch(Plane.XZ.offset(-13.9)):
        with BuildLine():
            Line((50.484835639, 6.020710177), (45.681240761, 2.821055998))
            Line((45.681240761, 2.821055998), (44.195895592, 3.188646515))
            Line((44.195895592, 3.188646515), (42.500675194, 8.914020867))
            ThreePointArc((42.500675194, 8.914020867), (49.357454542, 15.372571666), (50.484835639, 6.020710177))
        make_face()
    extrude(amount=EXTRUDE_17_DEPTH)

    # 草图48 → 凸台-拉伸18 (add)
    with BuildSketch(Plane(origin=(0, -11.8, 0), x_dir=(1, 0, 0), z_dir=(0, 1, 0))):
        with Locations((47.559828977, -10.41198068)):
            Circle(SKETCH_48_R)
    extrude(amount=EXTRUDE_18_DEPTH)


solid = part_1.part
